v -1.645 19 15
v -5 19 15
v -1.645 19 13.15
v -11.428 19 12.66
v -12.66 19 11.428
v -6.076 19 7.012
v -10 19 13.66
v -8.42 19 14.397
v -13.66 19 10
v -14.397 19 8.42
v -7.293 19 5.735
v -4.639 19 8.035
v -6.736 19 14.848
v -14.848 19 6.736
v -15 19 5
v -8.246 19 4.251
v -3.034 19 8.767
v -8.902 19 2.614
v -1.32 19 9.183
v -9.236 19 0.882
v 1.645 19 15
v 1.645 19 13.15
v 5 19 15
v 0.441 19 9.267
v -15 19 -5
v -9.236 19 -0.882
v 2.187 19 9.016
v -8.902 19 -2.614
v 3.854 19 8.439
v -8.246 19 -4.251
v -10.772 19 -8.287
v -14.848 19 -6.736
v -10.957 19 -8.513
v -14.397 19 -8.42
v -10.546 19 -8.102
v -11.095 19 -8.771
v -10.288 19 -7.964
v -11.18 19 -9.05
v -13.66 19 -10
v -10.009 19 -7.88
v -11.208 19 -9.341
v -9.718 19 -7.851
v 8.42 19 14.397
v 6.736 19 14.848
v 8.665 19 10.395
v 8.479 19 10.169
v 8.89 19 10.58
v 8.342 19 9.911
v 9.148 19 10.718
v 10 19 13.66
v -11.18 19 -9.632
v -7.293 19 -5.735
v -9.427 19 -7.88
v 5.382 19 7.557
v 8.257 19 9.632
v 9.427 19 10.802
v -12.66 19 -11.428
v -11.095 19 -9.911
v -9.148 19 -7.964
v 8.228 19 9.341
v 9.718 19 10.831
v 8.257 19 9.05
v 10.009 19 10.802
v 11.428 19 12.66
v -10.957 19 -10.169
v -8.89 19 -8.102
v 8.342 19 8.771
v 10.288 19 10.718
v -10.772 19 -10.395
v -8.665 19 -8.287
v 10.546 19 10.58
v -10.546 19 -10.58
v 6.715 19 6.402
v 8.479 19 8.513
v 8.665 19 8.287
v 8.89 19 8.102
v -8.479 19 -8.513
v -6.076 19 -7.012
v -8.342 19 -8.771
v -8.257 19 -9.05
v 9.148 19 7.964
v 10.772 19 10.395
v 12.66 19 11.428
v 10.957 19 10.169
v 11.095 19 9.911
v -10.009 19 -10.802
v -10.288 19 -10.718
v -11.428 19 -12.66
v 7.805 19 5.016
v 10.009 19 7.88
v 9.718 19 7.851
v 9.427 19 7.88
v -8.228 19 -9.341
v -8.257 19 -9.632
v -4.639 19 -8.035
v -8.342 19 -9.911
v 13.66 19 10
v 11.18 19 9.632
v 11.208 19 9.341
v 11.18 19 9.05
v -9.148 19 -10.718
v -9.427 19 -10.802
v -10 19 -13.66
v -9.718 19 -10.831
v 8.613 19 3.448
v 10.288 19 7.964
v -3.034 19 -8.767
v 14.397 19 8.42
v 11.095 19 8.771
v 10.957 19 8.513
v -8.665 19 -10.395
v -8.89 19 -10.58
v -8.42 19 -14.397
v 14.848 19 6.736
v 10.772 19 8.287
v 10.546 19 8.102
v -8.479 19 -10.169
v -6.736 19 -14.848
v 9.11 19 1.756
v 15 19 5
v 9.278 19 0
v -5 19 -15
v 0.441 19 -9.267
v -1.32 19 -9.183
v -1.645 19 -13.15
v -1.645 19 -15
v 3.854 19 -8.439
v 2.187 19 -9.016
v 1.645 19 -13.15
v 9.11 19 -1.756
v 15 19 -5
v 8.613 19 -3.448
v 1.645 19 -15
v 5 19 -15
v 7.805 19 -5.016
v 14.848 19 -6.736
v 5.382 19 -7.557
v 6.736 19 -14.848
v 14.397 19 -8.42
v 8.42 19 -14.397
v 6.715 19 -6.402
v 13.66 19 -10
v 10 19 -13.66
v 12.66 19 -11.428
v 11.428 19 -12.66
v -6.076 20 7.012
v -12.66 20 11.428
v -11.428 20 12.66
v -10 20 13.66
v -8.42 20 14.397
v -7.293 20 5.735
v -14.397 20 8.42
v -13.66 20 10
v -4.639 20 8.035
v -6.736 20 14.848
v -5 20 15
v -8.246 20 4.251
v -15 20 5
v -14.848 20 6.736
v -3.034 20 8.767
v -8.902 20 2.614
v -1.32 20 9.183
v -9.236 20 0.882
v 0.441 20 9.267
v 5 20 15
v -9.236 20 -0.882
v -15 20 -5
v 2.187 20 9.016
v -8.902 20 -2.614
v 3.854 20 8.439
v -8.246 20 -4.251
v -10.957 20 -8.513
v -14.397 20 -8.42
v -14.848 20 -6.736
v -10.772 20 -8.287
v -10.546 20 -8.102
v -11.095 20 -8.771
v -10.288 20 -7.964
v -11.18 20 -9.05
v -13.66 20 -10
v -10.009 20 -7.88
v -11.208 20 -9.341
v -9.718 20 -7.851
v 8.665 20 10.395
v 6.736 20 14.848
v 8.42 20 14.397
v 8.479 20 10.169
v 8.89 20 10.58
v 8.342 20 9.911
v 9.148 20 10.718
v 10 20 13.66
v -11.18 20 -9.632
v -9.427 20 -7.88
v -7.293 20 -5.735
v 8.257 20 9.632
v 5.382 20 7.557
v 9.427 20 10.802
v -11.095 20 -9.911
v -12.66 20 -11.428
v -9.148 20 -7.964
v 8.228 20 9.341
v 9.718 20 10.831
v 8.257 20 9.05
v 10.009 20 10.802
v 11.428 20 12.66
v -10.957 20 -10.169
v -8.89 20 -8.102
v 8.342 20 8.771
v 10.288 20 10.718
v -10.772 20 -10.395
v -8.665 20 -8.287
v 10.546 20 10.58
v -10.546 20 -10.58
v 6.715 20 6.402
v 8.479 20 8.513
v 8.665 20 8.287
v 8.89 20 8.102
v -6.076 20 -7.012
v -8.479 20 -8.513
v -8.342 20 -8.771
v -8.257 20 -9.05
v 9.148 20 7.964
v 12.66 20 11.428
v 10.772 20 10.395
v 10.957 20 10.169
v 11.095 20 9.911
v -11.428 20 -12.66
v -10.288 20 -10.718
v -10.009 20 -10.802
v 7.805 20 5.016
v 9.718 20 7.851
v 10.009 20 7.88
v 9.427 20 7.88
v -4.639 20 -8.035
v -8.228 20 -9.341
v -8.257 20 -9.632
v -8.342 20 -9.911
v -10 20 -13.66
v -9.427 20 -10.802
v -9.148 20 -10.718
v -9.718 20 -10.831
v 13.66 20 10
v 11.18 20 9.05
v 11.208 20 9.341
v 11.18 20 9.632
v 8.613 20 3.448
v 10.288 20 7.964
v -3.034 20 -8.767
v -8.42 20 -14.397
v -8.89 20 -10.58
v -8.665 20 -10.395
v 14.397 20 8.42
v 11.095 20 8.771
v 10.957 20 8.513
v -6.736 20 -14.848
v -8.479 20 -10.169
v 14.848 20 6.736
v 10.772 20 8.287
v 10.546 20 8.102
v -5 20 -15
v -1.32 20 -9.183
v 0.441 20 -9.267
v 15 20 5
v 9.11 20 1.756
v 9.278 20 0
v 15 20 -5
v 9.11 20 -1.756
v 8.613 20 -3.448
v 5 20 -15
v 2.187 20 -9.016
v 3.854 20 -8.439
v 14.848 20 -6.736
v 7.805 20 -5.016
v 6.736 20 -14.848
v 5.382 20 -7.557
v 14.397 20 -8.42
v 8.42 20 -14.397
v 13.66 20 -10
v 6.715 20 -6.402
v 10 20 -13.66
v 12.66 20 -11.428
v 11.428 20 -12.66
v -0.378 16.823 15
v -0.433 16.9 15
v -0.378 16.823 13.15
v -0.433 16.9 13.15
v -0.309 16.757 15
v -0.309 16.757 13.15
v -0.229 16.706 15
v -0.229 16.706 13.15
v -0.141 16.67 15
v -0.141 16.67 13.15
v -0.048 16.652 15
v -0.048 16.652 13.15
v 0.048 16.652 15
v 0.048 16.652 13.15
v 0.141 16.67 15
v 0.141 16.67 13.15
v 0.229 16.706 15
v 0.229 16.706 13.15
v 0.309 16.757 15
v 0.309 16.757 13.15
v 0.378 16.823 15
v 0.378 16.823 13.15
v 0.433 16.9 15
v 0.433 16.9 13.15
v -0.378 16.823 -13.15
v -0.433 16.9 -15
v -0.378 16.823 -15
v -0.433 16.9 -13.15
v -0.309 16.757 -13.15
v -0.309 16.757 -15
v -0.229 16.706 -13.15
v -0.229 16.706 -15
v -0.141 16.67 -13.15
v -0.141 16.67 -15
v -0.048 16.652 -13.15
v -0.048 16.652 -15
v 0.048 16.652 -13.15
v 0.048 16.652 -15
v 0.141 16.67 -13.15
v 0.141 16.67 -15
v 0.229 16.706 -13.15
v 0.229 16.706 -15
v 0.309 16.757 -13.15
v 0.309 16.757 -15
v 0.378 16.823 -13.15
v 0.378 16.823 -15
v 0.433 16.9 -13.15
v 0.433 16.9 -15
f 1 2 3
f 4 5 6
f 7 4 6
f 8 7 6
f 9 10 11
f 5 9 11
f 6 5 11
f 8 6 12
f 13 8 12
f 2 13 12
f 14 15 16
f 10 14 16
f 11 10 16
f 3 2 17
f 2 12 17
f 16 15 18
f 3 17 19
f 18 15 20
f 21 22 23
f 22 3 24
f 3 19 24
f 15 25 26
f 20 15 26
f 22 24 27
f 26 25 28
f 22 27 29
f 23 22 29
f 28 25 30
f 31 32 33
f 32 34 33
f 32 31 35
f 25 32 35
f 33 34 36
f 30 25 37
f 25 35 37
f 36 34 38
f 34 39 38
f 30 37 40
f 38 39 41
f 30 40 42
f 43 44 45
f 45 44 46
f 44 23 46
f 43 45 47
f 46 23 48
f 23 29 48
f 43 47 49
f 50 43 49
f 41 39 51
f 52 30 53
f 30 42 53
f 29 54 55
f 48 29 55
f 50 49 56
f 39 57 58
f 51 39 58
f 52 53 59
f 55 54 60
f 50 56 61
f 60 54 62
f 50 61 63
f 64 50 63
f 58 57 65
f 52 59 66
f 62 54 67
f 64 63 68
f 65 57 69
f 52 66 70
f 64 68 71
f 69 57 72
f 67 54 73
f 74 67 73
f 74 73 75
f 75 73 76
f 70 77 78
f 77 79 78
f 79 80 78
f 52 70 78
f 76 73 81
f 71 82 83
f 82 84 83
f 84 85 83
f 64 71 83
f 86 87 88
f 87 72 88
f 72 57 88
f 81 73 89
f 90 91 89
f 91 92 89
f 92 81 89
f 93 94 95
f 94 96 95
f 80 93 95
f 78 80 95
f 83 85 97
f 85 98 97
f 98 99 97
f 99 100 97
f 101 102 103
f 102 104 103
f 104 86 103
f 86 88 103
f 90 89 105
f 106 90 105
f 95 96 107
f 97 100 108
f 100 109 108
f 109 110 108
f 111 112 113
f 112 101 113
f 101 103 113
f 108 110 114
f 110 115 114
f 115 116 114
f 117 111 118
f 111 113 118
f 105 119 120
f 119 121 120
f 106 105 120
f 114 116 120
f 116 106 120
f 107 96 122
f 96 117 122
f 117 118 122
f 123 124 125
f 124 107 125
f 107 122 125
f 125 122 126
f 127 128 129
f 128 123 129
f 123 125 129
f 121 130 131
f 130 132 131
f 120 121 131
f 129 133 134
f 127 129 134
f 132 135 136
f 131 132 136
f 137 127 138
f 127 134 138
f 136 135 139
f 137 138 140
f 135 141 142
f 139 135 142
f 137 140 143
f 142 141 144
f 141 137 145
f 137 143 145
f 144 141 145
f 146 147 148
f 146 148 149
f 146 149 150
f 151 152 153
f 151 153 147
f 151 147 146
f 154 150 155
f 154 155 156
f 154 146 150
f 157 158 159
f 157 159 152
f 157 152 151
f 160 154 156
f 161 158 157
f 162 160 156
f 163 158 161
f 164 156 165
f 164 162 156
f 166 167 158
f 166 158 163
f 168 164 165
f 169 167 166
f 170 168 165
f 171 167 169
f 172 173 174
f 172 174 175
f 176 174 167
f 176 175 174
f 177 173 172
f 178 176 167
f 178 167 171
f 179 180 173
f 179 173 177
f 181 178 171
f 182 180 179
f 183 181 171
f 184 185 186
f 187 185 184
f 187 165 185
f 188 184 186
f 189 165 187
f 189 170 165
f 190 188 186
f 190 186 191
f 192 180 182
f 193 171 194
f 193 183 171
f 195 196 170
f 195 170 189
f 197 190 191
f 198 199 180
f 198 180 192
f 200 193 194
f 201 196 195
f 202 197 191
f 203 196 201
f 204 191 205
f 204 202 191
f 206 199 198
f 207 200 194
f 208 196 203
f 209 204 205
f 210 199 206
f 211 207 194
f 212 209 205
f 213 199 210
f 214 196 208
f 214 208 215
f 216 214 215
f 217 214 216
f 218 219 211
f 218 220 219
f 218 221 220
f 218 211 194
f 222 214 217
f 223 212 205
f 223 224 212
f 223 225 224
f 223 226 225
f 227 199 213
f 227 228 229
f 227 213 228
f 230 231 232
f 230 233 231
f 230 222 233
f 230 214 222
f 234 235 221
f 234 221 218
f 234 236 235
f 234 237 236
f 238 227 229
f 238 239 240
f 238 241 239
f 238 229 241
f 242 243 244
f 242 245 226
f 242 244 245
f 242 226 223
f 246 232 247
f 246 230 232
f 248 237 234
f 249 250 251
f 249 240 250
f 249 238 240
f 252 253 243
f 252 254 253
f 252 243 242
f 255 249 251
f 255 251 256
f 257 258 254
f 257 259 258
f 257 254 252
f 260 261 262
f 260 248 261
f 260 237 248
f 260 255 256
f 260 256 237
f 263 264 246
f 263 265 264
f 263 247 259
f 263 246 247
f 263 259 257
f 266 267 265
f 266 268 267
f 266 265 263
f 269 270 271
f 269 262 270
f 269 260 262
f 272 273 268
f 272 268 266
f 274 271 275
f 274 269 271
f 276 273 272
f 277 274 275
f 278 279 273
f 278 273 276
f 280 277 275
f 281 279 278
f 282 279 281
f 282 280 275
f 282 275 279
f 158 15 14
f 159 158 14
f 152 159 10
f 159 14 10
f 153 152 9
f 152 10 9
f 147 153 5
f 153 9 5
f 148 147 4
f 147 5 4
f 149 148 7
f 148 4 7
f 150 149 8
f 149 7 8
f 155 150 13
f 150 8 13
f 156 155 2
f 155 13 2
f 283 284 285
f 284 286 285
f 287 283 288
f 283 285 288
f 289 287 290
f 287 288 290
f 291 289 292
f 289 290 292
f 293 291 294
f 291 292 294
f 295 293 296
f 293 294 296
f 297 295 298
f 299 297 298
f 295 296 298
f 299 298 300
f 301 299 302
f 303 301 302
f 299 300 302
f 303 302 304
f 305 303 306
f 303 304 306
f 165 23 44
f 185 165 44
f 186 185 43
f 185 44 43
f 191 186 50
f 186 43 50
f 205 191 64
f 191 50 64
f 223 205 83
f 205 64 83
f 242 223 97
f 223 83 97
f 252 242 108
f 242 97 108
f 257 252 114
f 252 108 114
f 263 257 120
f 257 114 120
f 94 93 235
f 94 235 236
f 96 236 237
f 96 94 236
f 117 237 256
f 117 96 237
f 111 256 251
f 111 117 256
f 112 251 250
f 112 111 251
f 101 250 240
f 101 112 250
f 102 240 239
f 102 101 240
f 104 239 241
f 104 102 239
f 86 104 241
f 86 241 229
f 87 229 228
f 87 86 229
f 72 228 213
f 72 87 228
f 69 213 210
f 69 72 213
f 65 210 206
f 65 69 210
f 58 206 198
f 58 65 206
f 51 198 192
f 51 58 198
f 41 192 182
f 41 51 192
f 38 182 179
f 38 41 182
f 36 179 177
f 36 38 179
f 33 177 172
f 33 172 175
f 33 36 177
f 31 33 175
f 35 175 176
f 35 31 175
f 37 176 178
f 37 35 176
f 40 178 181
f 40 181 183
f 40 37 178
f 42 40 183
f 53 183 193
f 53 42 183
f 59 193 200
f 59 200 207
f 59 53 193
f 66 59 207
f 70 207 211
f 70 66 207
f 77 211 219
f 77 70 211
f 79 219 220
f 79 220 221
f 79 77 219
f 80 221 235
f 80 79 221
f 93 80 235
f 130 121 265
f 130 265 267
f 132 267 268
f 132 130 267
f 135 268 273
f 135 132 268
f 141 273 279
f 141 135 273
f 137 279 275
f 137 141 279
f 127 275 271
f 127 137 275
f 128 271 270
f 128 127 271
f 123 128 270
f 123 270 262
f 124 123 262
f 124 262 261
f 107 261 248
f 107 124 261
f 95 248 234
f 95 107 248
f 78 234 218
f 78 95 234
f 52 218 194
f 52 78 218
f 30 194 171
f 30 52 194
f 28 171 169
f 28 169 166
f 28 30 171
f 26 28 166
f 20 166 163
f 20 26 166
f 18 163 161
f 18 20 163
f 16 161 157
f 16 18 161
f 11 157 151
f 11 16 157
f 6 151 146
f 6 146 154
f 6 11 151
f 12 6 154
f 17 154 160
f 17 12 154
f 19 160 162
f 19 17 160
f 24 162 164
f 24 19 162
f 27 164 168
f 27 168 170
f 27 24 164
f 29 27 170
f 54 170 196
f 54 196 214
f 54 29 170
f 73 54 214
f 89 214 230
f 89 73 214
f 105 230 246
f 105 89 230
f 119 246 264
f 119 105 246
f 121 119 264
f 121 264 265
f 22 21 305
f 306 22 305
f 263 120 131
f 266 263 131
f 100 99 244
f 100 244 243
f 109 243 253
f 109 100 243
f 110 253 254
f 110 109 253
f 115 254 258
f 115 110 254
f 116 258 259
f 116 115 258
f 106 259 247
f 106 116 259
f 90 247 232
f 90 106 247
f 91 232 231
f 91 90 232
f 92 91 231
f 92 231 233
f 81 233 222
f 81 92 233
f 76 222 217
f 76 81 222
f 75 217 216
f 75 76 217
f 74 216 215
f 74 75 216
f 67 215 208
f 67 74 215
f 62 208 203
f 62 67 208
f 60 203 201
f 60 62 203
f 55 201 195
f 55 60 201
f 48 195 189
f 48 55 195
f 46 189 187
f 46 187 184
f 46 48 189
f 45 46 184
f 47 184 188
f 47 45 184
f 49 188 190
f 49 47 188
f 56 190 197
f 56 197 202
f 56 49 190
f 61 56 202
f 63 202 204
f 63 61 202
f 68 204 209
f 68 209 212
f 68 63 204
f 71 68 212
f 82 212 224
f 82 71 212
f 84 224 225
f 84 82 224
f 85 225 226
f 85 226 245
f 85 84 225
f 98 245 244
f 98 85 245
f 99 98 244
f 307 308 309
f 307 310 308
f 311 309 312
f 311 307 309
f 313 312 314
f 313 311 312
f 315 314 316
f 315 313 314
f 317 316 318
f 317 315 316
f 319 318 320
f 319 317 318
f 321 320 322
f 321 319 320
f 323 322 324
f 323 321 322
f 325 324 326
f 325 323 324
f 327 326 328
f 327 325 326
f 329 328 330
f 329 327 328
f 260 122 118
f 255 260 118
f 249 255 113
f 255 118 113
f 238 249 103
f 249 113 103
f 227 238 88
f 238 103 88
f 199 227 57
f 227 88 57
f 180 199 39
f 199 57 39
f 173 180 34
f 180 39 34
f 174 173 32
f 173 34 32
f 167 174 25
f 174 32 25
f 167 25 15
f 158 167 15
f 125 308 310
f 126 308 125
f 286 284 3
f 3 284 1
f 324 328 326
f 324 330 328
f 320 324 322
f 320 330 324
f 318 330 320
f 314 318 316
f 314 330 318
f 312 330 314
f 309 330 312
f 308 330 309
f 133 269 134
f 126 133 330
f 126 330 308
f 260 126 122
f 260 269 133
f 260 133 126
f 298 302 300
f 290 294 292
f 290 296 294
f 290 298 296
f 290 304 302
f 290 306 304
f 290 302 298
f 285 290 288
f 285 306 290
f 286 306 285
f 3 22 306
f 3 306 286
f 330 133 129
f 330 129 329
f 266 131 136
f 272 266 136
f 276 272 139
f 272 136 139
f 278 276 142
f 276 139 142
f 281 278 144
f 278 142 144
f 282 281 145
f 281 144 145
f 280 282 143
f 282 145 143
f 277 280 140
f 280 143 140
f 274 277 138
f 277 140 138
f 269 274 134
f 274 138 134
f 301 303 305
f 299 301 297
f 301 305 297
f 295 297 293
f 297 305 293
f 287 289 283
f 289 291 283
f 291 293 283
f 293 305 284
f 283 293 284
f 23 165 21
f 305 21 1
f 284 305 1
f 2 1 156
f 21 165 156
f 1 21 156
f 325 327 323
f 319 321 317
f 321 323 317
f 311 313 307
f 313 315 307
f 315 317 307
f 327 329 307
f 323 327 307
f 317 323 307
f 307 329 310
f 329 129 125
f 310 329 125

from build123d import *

# Parameters (mm, degrees)
BASISTEIL_MOLDINGFORMUMRELLAV1_0_0_SAK_1_START = 19
BASISTEIL_MOLDINGFORMUMRELLAV1_0_0_S_2_R       = 1.49
BASISTEIL_MOLDINGFORMUMRELLAV1_0_0_S_2_R_2     = 9.27775
BASISTEIL_MOLDINGFORMUMRELLAV1_0_0_SAK_1_DEPTH = 1
AUFSATZ_LINEAR_AUSTRAGEN1_DEPTH                = 1.85
VERRUNDUNG1_R                                  = 0.5


# Read off the part's stored shape, not the designer's step: Basisteil-MoldingFormUmrellaV1_0_0_SAK-1
with BuildPart() as part:
    # Basisteil-MoldingFormUmrellaV1_0_0_S 2 → Basisteil-MoldingFormUmrellaV1_0_0_SAK-1 (new body)
    with BuildSketch(Plane(origin=(0, 0, 0), x_dir=(1, 0, 0), z_dir=(0, 1, 0)).offset(BASISTEIL_MOLDINGFORMUMRELLAV1_0_0_SAK_1_START)):
        with BuildLine():
            Line((5, 15), (-5, 15))
            ThreePointArc((-5, 15), (-12.071067812, 12.071067812), (-15, 5))
            Line((-15, 5), (-15, -5))
            ThreePointArc((-15, -5), (-12.071067812, -12.071067812), (-5, -15))
            Line((-5, -15), (5, -15))
            ThreePointArc((5, -15), (12.071067812, -12.071067812), (15, -5))
            Line((15, -5), (15, 5))
            ThreePointArc((15, 5), (12.071067812, 12.071067812), (5, 15))
        make_face()
        with Locations((9.718159066, -9.341055177)):
            Circle(BASISTEIL_MOLDINGFORMUMRELLAV1_0_0_S_2_R, mode=Mode.SUBTRACT)
        with Locations((-9.718159066, 9.341055177)):
            Circle(BASISTEIL_MOLDINGFORMUMRELLAV1_0_0_S_2_R, mode=Mode.SUBTRACT)
        Circle(BASISTEIL_MOLDINGFORMUMRELLAV1_0_0_S_2_R_2, mode=Mode.SUBTRACT)
    extrude(amount=BASISTEIL_MOLDINGFORMUMRELLAV1_0_0_SAK_1_DEPTH)

    # Skizze1 → Aufsatz-Linear austragen1 (add)
    with BuildSketch(Plane(origin=(0, 0, -15), x_dir=(-1, 0, 0), z_dir=(0, 0, -1))):
        Polygon((0, 16.15), (1.861417329, 19.374069389), (-1.861417329, 19.374069389), align=None)
    aufsatz_linear_austragen1 = extrude(amount=-AUFSATZ_LINEAR_AUSTRAGEN1_DEPTH)

    # Spiegeln1: Aufsatz-Linear austragen1 across plane
    add(aufsatz_linear_austragen1.mirror(Plane(origin=(0, 0, 0), x_dir=(1, 0, 0), z_dir=(0, 0, -1))))

    # Verrundung1
    verrundung1_edges = [part.edges().sort_by_distance(p)[0] for p in [
        (0, 16.15, -14.075),
        (0, 16.15, 14.075),
    ]]
    fillet(verrundung1_edges, radius=VERRUNDUNG1_R)


solid = part.part
